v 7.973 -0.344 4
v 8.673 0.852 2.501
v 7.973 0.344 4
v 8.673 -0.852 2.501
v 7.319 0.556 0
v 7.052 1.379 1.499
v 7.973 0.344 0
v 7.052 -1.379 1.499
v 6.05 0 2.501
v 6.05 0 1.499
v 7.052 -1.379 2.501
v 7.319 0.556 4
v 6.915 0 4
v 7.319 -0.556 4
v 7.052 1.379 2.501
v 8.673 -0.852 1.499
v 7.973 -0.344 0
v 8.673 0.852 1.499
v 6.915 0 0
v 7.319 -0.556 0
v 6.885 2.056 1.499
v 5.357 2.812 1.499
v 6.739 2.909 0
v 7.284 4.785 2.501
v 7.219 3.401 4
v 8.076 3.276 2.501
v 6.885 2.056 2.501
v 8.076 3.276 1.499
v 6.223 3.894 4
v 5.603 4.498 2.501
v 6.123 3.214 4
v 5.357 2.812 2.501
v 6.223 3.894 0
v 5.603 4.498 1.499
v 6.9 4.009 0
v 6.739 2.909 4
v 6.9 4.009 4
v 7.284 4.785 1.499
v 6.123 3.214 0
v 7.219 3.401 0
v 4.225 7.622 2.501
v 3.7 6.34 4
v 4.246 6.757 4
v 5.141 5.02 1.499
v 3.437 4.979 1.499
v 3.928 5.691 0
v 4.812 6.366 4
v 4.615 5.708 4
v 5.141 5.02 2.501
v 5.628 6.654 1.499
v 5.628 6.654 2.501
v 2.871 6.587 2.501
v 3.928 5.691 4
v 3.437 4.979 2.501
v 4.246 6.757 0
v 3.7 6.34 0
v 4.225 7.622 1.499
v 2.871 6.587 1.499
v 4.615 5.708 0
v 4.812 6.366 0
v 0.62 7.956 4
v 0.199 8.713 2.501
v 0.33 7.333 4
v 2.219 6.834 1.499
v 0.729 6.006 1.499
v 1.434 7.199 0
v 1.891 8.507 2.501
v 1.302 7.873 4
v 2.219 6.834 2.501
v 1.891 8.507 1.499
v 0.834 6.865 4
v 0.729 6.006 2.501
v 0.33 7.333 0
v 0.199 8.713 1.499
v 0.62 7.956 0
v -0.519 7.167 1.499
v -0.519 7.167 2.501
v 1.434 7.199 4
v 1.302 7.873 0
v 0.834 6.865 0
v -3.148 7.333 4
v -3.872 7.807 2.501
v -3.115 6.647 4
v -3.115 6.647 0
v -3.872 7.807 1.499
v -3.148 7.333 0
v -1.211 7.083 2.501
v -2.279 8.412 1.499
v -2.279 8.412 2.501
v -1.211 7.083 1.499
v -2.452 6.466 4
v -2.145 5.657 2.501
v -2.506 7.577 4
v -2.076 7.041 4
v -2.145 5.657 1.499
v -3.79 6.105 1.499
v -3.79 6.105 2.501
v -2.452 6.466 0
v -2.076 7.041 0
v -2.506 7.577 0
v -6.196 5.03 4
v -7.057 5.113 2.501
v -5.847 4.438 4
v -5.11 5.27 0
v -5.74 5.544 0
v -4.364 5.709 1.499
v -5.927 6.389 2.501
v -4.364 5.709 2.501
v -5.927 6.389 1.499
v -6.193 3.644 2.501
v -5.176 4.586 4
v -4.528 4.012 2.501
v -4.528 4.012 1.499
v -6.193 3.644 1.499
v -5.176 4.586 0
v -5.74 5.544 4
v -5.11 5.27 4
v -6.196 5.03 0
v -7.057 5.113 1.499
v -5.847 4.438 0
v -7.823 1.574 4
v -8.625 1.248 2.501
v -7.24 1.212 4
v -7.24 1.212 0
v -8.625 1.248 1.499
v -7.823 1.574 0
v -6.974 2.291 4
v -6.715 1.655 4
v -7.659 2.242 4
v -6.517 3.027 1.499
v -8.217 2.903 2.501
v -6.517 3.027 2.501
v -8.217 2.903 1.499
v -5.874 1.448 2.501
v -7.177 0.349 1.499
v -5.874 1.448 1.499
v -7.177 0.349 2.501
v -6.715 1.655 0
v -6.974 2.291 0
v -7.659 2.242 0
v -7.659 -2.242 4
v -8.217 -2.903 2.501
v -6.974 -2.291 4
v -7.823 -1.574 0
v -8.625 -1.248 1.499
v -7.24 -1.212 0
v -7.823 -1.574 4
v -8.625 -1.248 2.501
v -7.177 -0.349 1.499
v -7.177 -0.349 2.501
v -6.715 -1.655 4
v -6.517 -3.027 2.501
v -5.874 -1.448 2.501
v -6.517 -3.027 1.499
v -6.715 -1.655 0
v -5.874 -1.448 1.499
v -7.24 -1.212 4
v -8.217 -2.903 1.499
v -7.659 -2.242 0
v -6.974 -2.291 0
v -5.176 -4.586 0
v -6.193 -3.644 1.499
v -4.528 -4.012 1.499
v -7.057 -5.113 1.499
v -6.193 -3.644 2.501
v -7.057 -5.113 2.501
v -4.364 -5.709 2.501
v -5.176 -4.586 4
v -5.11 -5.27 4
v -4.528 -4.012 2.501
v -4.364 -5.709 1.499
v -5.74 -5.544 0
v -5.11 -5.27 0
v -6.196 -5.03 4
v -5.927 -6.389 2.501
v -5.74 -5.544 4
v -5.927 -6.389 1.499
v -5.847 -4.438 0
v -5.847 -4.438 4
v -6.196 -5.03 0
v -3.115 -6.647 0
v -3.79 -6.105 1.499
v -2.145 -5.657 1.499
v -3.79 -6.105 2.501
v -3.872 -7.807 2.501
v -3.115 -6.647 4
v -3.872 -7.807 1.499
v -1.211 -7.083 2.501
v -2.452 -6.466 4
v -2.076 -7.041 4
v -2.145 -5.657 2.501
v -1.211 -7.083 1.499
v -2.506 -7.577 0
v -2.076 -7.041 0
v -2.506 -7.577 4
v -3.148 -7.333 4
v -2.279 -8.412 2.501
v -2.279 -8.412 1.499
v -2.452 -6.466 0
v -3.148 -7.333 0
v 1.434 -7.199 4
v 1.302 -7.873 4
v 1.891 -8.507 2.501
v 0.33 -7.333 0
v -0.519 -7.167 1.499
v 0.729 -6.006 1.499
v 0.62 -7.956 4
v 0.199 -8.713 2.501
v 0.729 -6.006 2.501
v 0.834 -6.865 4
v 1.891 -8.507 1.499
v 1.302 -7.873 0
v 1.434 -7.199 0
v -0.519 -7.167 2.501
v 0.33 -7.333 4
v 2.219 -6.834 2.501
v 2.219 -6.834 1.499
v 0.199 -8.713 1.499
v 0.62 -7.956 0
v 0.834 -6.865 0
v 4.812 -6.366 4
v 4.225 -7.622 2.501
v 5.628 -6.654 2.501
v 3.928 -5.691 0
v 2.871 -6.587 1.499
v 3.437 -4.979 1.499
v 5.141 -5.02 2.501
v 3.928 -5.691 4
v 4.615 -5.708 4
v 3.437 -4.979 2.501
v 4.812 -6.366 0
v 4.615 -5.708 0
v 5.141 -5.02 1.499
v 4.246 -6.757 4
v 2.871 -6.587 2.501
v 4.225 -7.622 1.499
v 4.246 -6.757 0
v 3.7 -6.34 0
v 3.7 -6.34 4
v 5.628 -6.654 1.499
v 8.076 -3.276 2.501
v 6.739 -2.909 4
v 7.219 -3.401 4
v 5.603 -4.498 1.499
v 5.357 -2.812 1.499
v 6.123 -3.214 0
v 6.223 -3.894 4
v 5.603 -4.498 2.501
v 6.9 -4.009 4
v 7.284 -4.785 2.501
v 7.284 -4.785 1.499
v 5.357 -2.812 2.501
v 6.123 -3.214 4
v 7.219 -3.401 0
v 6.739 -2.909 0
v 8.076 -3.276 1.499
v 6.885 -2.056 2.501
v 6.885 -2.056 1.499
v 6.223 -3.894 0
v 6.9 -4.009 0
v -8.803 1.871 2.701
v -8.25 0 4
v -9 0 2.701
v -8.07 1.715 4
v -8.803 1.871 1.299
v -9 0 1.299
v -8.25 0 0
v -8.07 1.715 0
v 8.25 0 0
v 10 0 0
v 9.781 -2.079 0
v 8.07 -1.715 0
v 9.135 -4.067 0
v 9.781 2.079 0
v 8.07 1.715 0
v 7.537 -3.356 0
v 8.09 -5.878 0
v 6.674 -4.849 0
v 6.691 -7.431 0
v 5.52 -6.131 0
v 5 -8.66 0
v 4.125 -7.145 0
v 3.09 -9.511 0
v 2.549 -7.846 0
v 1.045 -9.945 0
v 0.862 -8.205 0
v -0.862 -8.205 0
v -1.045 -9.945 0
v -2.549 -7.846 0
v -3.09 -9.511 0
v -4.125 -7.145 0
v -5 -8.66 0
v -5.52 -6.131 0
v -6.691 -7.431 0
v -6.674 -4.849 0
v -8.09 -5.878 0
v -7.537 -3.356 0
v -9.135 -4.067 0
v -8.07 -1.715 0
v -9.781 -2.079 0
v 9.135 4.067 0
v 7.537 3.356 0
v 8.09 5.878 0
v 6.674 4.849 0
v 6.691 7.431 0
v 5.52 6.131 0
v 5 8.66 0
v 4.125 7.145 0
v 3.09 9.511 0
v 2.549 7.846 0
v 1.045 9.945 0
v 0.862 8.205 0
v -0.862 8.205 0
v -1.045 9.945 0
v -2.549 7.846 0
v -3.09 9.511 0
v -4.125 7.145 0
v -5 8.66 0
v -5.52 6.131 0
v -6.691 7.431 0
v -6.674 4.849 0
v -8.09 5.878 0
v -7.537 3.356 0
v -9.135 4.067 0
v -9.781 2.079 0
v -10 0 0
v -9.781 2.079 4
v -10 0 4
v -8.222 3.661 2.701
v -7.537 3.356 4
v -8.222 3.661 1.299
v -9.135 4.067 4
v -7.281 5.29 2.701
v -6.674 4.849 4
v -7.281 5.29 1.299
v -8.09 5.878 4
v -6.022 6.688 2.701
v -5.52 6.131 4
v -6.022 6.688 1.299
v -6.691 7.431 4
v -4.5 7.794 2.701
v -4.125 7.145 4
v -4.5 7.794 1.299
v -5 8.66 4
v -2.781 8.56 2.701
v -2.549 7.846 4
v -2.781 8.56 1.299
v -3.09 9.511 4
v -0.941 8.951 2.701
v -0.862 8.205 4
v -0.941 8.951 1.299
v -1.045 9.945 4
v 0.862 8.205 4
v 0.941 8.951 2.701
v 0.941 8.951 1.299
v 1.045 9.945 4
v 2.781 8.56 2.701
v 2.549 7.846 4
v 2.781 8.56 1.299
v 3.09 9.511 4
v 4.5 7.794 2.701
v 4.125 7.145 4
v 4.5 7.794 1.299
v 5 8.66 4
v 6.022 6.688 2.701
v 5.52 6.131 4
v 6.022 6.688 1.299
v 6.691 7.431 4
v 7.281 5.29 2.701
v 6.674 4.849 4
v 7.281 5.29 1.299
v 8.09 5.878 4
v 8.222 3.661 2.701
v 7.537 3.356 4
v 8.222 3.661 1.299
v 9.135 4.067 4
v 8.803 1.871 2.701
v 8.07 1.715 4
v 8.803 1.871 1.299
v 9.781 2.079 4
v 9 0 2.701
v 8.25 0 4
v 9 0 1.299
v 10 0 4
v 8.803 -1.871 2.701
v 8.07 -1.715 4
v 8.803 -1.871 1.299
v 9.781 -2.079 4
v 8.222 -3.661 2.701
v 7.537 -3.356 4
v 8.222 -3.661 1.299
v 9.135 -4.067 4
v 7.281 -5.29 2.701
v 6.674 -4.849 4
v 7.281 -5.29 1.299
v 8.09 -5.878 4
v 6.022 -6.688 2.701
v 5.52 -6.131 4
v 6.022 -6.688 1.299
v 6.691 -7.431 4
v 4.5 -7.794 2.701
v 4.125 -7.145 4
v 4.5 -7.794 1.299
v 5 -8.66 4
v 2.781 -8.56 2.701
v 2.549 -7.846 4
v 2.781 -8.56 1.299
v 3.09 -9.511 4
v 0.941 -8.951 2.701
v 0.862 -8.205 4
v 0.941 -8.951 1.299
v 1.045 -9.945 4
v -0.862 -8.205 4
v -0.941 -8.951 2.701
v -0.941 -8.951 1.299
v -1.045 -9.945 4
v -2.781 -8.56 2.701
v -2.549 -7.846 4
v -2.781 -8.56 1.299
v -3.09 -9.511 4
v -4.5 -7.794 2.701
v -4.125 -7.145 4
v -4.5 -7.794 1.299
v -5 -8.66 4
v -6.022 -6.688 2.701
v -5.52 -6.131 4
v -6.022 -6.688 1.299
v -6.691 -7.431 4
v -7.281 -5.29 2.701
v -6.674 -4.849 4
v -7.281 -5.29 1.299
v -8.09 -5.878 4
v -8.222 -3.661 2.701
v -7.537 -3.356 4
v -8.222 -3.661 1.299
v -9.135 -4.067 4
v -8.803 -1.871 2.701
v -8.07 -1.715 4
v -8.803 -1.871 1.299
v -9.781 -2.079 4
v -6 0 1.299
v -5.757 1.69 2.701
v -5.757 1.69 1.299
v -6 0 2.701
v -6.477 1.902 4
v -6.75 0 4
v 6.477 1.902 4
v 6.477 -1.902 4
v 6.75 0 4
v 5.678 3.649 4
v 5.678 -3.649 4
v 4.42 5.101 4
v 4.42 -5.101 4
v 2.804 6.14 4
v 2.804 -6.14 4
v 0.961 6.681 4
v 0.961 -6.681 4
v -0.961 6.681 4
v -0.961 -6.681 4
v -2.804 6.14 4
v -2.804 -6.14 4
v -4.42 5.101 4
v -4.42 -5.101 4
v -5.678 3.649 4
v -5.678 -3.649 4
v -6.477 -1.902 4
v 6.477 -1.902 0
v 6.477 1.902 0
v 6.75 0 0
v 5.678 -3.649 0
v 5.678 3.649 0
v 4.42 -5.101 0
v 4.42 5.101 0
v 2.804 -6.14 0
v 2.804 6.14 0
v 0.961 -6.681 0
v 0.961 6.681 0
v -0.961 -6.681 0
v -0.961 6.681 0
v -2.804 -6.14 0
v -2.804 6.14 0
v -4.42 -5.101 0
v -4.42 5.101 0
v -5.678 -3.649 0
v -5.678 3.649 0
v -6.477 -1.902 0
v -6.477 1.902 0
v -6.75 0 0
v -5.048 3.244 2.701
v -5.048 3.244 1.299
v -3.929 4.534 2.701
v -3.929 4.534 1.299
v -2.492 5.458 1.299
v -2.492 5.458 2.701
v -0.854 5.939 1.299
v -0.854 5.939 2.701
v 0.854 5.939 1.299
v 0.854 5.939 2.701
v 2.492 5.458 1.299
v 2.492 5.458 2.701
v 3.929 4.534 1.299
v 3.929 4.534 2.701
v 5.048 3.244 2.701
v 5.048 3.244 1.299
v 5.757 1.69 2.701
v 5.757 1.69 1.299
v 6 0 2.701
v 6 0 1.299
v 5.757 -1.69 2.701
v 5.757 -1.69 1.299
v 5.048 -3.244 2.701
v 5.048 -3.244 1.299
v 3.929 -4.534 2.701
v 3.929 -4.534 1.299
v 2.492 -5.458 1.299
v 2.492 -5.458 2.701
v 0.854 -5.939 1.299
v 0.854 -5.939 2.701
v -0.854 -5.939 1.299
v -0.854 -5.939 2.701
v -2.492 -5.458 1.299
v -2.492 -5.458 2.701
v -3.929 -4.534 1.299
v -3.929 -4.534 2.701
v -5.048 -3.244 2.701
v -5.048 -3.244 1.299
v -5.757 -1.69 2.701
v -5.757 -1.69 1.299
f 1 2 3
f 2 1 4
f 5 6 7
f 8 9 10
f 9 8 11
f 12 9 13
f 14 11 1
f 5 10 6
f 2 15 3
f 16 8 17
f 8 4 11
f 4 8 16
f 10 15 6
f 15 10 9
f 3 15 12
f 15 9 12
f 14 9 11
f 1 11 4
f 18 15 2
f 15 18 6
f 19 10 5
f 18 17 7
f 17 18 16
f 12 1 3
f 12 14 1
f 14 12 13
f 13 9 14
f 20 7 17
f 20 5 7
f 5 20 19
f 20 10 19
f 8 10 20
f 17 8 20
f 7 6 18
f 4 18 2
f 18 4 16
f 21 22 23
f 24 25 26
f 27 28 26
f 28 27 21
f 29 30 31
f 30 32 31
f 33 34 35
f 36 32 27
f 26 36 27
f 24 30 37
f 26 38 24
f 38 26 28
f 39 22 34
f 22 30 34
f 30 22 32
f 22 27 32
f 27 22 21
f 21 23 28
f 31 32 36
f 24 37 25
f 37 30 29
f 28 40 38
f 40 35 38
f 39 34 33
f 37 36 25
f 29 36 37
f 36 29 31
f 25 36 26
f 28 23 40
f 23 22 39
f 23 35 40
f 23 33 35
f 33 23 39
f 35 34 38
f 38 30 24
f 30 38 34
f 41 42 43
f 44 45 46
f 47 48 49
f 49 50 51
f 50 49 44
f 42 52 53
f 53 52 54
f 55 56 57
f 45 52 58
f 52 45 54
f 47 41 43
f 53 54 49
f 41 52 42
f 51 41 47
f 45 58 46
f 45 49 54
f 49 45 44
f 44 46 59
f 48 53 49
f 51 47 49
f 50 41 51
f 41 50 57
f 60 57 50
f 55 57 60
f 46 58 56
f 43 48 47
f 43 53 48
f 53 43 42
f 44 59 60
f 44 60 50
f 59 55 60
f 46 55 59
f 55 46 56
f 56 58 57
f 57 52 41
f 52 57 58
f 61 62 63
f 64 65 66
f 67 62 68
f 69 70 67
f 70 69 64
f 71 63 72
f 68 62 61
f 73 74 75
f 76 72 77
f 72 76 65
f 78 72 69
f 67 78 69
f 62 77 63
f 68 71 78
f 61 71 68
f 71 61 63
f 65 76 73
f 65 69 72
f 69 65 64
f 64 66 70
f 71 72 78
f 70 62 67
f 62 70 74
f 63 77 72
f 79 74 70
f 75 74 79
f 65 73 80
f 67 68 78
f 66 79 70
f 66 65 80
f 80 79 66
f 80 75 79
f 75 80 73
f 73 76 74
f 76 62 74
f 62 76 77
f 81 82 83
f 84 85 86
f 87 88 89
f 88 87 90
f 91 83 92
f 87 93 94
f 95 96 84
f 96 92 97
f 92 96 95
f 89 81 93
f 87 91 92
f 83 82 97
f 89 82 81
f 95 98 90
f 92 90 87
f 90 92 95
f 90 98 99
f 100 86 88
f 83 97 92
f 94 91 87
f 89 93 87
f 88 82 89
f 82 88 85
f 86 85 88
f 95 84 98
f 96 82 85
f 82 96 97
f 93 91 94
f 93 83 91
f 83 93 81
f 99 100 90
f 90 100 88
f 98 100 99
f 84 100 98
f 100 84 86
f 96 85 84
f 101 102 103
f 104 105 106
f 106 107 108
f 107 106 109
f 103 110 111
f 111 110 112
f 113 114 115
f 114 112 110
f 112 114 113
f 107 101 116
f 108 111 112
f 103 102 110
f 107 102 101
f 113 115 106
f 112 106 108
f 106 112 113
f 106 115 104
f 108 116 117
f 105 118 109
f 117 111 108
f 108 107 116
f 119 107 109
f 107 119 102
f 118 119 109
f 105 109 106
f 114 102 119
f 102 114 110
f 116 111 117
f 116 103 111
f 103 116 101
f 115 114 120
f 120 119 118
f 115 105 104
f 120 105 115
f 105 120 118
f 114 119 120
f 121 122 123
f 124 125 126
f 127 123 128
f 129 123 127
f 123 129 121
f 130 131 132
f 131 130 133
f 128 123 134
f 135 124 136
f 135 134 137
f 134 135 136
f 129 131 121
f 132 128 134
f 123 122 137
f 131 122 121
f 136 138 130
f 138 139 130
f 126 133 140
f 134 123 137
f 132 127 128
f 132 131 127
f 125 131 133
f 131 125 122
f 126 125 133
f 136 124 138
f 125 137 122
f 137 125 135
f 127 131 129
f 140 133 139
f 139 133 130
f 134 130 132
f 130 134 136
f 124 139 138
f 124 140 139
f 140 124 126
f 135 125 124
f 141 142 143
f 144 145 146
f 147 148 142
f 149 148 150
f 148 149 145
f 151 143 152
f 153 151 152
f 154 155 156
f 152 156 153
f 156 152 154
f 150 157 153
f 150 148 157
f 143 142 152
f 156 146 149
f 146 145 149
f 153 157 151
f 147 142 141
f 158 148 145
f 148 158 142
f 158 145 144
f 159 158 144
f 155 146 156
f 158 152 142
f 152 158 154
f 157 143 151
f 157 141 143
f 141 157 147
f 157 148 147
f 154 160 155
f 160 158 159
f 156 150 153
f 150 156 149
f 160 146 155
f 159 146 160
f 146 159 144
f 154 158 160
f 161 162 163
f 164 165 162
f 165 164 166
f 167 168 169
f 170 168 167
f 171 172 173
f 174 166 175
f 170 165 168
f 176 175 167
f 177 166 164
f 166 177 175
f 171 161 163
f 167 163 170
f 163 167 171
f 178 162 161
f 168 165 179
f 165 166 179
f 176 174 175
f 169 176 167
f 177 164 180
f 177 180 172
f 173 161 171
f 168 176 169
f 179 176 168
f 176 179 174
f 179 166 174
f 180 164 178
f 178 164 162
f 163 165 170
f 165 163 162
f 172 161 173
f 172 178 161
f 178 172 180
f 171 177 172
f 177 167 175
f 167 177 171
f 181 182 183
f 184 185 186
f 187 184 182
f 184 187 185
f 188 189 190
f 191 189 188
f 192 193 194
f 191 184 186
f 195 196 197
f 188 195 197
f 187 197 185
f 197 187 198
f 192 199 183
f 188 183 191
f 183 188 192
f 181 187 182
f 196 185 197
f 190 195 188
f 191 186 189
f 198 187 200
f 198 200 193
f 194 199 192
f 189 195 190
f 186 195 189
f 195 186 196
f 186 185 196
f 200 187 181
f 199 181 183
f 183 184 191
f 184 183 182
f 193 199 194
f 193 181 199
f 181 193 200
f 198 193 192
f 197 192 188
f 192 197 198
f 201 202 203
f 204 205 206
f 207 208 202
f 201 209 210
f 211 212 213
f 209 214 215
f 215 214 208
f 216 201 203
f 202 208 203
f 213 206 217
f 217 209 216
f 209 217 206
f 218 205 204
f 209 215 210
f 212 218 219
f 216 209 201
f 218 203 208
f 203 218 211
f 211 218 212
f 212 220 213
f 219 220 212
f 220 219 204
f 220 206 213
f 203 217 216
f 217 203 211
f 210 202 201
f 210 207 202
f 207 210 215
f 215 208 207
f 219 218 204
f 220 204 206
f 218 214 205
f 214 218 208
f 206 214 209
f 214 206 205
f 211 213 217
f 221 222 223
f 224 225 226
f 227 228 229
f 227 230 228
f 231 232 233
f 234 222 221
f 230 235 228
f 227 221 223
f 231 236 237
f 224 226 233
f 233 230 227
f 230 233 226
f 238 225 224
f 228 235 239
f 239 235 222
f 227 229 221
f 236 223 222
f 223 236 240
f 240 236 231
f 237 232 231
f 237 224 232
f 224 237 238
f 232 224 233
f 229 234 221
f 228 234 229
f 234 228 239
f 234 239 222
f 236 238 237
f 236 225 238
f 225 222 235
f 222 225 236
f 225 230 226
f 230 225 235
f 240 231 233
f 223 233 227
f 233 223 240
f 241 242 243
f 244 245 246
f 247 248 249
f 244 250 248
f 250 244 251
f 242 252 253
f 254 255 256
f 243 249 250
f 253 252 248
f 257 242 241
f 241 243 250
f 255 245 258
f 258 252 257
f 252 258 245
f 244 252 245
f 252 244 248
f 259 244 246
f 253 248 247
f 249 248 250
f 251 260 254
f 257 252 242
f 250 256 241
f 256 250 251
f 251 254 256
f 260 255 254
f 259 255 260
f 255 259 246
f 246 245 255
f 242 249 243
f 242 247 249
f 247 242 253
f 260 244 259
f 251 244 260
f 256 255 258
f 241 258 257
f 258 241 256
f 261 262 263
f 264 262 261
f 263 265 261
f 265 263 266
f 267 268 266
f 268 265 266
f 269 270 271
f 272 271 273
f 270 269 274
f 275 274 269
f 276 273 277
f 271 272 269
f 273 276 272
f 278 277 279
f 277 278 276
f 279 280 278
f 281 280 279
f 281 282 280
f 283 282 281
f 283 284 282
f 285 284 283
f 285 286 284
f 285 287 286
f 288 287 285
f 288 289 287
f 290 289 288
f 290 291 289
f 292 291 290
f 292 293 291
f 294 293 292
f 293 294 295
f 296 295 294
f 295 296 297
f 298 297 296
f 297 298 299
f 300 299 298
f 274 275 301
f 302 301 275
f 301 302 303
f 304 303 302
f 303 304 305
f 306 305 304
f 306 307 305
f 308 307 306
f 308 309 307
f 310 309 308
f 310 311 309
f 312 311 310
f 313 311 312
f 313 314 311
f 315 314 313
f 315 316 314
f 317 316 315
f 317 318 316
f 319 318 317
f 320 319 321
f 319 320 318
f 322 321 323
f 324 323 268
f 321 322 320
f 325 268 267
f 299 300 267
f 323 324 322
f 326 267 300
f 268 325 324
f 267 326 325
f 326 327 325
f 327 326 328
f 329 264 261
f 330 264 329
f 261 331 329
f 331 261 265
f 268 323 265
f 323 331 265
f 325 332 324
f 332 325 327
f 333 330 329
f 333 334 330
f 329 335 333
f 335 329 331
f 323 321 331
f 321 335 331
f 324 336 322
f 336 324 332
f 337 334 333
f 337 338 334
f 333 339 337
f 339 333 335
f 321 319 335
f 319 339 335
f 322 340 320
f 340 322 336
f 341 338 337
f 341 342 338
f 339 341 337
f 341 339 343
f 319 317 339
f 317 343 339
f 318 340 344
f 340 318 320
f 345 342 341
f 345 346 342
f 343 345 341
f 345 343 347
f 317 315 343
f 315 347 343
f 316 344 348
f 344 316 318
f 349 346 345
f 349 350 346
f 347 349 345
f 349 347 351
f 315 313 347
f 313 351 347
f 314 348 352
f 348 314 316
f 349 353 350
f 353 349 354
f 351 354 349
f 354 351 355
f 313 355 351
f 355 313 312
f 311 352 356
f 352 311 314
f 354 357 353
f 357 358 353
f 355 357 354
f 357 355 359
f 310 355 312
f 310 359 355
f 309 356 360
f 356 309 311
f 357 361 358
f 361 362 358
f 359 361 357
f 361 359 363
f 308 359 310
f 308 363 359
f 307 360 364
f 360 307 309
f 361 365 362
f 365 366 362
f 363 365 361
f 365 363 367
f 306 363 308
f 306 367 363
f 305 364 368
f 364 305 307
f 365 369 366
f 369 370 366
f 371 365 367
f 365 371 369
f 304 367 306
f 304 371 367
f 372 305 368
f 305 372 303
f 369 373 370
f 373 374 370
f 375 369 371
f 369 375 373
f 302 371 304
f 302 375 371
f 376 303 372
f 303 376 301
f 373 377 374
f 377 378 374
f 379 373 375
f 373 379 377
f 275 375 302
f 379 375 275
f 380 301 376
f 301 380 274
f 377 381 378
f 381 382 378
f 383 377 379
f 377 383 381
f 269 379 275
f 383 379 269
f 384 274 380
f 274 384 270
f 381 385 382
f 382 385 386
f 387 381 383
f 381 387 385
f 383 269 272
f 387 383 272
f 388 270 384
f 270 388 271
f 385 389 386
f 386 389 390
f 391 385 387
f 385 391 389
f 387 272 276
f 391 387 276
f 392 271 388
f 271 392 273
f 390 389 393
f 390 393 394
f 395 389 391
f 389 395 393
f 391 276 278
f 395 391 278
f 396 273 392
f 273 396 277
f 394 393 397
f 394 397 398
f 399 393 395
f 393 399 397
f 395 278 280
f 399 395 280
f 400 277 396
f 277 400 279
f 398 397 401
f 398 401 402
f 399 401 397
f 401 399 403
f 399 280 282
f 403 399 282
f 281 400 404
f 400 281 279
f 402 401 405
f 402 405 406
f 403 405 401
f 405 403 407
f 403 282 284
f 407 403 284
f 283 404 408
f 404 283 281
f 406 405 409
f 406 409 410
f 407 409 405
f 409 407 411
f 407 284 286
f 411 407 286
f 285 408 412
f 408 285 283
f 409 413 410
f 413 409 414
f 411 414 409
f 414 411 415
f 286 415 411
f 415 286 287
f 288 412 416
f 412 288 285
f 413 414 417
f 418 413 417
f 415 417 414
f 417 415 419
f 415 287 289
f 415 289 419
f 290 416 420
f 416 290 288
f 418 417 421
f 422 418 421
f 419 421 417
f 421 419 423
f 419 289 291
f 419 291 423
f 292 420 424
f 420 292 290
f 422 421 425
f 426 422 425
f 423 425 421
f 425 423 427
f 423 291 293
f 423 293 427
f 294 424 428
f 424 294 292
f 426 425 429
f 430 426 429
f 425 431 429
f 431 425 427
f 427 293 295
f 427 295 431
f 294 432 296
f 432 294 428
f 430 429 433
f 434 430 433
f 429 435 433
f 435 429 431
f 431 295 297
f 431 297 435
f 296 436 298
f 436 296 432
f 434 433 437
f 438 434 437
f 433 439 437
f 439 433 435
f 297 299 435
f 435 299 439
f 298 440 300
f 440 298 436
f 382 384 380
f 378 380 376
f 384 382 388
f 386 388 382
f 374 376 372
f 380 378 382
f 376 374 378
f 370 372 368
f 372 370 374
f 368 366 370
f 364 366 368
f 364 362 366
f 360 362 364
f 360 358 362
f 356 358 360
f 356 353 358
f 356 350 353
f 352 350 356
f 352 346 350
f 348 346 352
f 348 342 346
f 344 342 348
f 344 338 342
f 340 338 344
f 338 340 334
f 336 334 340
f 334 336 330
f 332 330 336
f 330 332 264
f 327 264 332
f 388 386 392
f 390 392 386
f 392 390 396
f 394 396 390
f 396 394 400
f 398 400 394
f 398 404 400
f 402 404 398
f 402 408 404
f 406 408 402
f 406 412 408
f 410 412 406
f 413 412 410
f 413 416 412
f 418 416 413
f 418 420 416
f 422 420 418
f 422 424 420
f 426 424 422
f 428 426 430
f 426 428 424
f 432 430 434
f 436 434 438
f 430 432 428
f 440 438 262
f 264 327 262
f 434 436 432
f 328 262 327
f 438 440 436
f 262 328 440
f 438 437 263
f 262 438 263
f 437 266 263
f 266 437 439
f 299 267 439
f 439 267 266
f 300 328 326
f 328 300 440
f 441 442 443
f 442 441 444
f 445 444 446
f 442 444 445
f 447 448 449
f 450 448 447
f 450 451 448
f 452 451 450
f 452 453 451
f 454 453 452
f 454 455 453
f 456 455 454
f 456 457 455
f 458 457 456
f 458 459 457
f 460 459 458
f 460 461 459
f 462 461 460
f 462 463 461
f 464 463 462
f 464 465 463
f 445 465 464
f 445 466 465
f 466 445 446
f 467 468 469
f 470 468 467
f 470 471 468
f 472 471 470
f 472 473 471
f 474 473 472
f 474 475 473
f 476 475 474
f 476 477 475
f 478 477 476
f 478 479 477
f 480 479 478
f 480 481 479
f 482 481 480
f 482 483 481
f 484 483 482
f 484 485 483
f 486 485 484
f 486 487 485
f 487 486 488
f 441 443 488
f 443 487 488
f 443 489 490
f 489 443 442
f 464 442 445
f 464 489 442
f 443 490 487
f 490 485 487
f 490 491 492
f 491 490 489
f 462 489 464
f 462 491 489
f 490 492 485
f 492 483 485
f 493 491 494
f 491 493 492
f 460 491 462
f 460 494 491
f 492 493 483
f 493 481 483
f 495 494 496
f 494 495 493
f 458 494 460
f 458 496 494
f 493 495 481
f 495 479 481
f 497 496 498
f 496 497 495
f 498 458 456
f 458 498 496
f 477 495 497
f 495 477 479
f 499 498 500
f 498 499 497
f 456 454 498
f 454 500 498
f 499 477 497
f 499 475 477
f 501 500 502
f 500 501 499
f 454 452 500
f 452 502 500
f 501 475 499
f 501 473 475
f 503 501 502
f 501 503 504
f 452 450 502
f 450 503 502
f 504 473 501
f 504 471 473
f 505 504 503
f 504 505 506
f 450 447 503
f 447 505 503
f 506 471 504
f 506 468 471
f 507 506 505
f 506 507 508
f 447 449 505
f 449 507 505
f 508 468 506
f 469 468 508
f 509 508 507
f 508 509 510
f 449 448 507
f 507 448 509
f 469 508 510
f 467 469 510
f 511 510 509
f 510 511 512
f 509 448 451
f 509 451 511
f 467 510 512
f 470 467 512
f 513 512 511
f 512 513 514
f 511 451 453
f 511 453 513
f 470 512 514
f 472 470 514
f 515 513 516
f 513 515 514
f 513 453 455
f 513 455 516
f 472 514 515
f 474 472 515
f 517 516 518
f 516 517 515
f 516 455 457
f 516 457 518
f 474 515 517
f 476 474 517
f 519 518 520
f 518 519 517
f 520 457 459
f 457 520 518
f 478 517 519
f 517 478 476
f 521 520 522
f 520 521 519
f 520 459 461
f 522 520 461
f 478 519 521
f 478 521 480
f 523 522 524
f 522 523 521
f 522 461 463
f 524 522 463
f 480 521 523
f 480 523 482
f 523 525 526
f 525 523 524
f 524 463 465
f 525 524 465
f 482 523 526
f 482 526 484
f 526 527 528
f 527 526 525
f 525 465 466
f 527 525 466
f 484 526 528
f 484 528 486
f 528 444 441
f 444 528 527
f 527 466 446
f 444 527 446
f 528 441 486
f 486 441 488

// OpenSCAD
module roller_bearing_roller(
    height, groove_width,
    contact_angle = 30, open_proportion = 0.4,
    side_tolerance = 0.05, vertical_tolerance = 0.2,
) {
    end_distance = vertical_tolerance + side_tolerance/tan(contact_angle);
    base_radius2 = open_proportion * groove_width/2;
    base_radius = base_radius2 - end_distance * tan(contact_angle);
    cylinder_radius = groove_width/2 - side_tolerance;
    closed_proportion = 1 - open_proportion;
    flap_width = closed_proportion * groove_width/2;
    flap_height = flap_width / tan(contact_angle);
    cone_height = flap_height + vertical_tolerance;
    
    rotate_extrude(angle = 360, convexity = 1)
    polygon([
        [0, height/2],
        [0, -height/2],
        [base_radius, -height/2],
        [cylinder_radius, -height/2 + cone_height],
        [cylinder_radius, height/2 - cone_height],
        [base_radius, height/2],
    ]);
}

module roller_bearing(
    height, radius, inner_proportion, outer_proportion,
    center = false,
    contact_angle = 30, open_proportion = 0.5,
    side_tolerance = 0.05, vertical_tolerance = 0.2
) {
    inner_radius = inner_proportion * radius;
    outer_radius = outer_proportion * radius;
    translate([0, 0, center ? 0 : height/2]) {
        groove_width = outer_radius - inner_radius;
        closed_proportion = 1 - open_proportion;
        flap_width = closed_proportion*groove_width/2;
        flap_height = flap_width / tan(contact_angle);
        
        rotate_extrude(angle = 360, convexity = 2)
        polygon([
            [outer_radius - flap_width, height/2],
            [outer_radius, height/2 - flap_height],
            [outer_radius, -height/2 + flap_height],
            [outer_radius - flap_width, -height/2],
            [radius, -height/2], [radius, height/2]
        ]);
        
        rotate_extrude(angle = 360, convexity = 2)
        polygon([
            [inner_radius + flap_width, -height/2],
            [inner_radius, -height/2 + flap_height],
            [inner_radius, height/2 - flap_height],
            [inner_radius + flap_width, height/2],
            [0, height/2], [0, -height/2]
        ]);
        
        track_radius = inner_radius + groove_width/2;
        track_length = 2 * PI * track_radius;
        n_rollers = floor(track_length / (1.2 * groove_width));
        step = 360 / n_rollers;
        for(phi = [0:step:360]) {
            rotate(phi, [0, 0, 1])
            translate([track_radius, 0, 0])
            roller_bearing_roller(
                height = height, groove_width = groove_width,
                contact_angle = contact_angle,
                open_proportion = open_proportion,
                side_tolerance = side_tolerance,
                vertical_tolerance = vertical_tolerance
            );
        }
    }
}

module roller_bearing_roller_2(
    height, groove_width,
    contact_angle = 30, open_proportion = 0.4,
    side_tolerance = 0.05, vertical_tolerance = 0.2,
) {
    end_distance = vertical_tolerance + side_tolerance/tan(contact_angle);
    base_radius2 = open_proportion * groove_width/2;
    base_radius = base_radius2 - side_tolerance;
    cylinder_radius = groove_width/2 - end_distance * tan(contact_angle);
    closed_proportion = 1 - open_proportion;
    flap_width = closed_proportion * groove_width/2;
    flap_height = flap_width / tan(contact_angle);
    cone_height = flap_height - vertical_tolerance;
    
    rotate_extrude(angle = 360, convexity = 1)
    polygon([
        [0, height/2],
        [0, -height/2],
        [cylinder_radius, -height/2],
        [base_radius, -height/2 + cone_height],
        [base_radius, height/2 - cone_height],
        [cylinder_radius, height/2],
    ]);
}

module roller_bearing_2(
    height, radius, inner_proportion, outer_proportion,
    center = false,
    contact_angle = 30, open_proportion = 0.5,
    side_tolerance = 0.05, vertical_tolerance = 0.2
) {
    inner_radius = inner_proportion * radius;
    outer_radius = outer_proportion * radius;
    translate([0, 0, center ? 0 : height/2]) {
        groove_width = outer_radius - inner_radius;
        closed_proportion = 1 - open_proportion;
        flap_width = closed_proportion*groove_width/2;
        flap_height = flap_width / tan(contact_angle);
        
        rotate_extrude(angle = 360, convexity = 2)
        polygon([
            [outer_radius, height/2],
            [outer_radius - flap_width, height/2 - flap_height],
            [outer_radius - flap_width, -height/2 + flap_height],
            [outer_radius, -height/2],
            [radius, -height/2], [radius, height/2]
        ]);
        
        rotate_extrude(angle = 360, convexity = 2)
        polygon([
            [inner_radius, -height/2],
            [inner_radius + flap_width, -height/2 + flap_height],
            [inner_radius + flap_width, height/2 - flap_height],
            [inner_radius, height/2],
            [0, height/2], [0, -height/2]
        ]);
        
        track_radius = inner_radius + groove_width/2;
        track_length = 2 * PI * track_radius;
        n_rollers = floor(track_length / (1.2 * groove_width));
        step = 360 / n_rollers;
        for(phi = [0:step:360]) {
            rotate(phi, [0, 0, 1])
            translate([track_radius, 0, 0])
            roller_bearing_roller_2(
                height = height, groove_width = groove_width,
                contact_angle = contact_angle,
                open_proportion = open_proportion,
                side_tolerance = side_tolerance,
                vertical_tolerance = vertical_tolerance
            );
        }
    }
}

module rotate_bearing(
    angle, radius,
    inner_proportion, outer_proportion
) {
    inner_radius = inner_proportion * radius;
    outer_radius = outer_proportion * radius;
    groove_width = outer_radius - inner_radius;
    inner_length = 2 * PI * inner_radius;
    track_radius = inner_radius + groove_width/2;
    track_length = 2 * PI * track_radius;
    roller_angle = angle * inner_length / 2 / track_length;
    rotate(roller_angle, [0, 0, 1])
        children();
}

/*intersection() {
    translate([0, 0, -2]) cube(10);
    roller_bearing(4, 10, 6, 9);
}*/

roller_bearing(4, 10, 0.6, 0.9);
